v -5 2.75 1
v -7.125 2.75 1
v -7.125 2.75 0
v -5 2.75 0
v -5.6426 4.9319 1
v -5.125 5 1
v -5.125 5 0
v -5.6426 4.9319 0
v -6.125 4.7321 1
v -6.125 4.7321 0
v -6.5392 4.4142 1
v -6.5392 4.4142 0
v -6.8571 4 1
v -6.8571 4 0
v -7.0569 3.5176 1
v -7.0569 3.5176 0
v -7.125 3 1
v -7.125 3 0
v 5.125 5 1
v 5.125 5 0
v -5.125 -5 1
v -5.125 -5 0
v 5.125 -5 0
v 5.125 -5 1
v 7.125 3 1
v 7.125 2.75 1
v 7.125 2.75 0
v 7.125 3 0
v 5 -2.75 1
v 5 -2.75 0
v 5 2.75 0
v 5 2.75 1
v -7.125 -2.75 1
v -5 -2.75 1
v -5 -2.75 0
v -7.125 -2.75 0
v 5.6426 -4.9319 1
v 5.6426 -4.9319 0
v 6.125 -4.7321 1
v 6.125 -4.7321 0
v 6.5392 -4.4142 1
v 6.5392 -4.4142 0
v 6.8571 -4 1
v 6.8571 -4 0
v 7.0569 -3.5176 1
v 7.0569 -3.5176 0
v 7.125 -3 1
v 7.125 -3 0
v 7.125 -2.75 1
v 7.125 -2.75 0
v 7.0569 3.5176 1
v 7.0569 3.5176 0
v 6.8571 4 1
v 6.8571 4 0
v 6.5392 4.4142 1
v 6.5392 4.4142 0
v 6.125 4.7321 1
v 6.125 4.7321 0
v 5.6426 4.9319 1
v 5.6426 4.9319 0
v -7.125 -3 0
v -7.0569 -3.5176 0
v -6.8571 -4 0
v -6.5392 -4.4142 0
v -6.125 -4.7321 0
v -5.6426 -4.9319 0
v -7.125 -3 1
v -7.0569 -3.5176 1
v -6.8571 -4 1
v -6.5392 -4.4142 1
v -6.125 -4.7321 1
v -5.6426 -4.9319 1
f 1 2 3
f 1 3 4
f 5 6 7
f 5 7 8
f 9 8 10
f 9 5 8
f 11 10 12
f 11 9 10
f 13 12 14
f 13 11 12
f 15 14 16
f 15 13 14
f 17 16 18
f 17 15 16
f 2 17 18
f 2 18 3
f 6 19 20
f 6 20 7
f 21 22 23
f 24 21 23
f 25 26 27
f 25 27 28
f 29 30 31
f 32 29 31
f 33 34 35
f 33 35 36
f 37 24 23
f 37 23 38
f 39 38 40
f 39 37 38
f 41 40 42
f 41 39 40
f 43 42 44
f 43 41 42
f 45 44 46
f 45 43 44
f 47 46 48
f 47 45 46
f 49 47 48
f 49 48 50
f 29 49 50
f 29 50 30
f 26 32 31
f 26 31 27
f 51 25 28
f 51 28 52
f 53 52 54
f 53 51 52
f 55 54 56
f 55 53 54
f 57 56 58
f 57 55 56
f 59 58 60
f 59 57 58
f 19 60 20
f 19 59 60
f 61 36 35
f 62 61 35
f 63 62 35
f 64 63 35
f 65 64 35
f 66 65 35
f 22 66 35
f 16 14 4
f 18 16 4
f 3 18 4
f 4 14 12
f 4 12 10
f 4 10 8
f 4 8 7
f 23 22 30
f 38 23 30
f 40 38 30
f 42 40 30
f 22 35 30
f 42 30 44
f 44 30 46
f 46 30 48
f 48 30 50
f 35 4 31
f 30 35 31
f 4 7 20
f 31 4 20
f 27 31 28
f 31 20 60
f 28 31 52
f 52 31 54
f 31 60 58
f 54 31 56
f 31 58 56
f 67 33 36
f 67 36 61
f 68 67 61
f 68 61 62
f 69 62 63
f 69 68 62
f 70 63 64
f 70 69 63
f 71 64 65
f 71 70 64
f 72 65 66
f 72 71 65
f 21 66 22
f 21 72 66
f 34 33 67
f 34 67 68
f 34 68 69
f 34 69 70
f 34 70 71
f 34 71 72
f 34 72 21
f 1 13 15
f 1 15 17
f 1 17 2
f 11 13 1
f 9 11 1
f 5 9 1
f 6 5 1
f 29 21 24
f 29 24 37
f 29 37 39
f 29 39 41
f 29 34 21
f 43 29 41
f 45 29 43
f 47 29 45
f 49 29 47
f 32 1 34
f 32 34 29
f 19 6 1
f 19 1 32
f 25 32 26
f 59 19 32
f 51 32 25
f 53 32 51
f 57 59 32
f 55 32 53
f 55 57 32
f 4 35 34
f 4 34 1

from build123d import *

# Parameters (mm, degrees)
CROQUIS1_W              = 10
CROQUIS1_H              = 10
SALIENTE_EXTRUIR1_DEPTH = 1
SALIENTE_EXTRUIR2_DEPTH = 1


with BuildPart() as part:
    # Croquis1 → Saliente-Extruir1 (new body)
    with BuildSketch(Plane.XY):
        Rectangle(CROQUIS1_W, CROQUIS1_H)
    extrude(amount=SALIENTE_EXTRUIR1_DEPTH)

    # Croquis2 → Saliente-Extruir2 (add, through all)
    with BuildSketch(Plane.XY.offset(1)):
        with BuildLine():
            Line((-5, 5), (-5.125, 5))
            ThreePointArc((-5.125, 5), (-6.539213562, 4.414213562), (-7.125, 3))
            Line((-7.125, 3), (-7.125, 2.75))
            Line((-7.125, 2.75), (-5, 2.75))
            Line((-5, 2.75), (-5, 5))
        make_face()
        with BuildLine():
            Line((5, 2.75), (7.125, 2.75))
            Line((7.125, 2.75), (7.125, 3))
            ThreePointArc((7.125, 3), (6.539213562, 4.414213562), (5.125, 5))
            Line((5.125, 5), (5, 5))
            Line((5, 5), (5, 2.75))
        make_face()
        with BuildLine():
            Line((5, -5), (5.125, -5))
            ThreePointArc((5.125, -5), (6.539213562, -4.414213562), (7.125, -3))
            Line((7.125, -3), (7.125, -2.75))
            Line((7.125, -2.75), (5, -2.75))
            Line((5, -2.75), (5, -5))
        make_face()
        with BuildLine():
            Line((-5, -2.75), (-7.125, -2.75))
            Line((-7.125, -2.75), (-7.125, -3))
            ThreePointArc((-7.125, -3), (-6.539213562, -4.414213562), (-5.125, -5))
            Line((-5.125, -5), (-5, -5))
            Line((-5, -5), (-5, -2.75))
        make_face()
    extrude(amount=-SALIENTE_EXTRUIR2_DEPTH)


solid = part.part
